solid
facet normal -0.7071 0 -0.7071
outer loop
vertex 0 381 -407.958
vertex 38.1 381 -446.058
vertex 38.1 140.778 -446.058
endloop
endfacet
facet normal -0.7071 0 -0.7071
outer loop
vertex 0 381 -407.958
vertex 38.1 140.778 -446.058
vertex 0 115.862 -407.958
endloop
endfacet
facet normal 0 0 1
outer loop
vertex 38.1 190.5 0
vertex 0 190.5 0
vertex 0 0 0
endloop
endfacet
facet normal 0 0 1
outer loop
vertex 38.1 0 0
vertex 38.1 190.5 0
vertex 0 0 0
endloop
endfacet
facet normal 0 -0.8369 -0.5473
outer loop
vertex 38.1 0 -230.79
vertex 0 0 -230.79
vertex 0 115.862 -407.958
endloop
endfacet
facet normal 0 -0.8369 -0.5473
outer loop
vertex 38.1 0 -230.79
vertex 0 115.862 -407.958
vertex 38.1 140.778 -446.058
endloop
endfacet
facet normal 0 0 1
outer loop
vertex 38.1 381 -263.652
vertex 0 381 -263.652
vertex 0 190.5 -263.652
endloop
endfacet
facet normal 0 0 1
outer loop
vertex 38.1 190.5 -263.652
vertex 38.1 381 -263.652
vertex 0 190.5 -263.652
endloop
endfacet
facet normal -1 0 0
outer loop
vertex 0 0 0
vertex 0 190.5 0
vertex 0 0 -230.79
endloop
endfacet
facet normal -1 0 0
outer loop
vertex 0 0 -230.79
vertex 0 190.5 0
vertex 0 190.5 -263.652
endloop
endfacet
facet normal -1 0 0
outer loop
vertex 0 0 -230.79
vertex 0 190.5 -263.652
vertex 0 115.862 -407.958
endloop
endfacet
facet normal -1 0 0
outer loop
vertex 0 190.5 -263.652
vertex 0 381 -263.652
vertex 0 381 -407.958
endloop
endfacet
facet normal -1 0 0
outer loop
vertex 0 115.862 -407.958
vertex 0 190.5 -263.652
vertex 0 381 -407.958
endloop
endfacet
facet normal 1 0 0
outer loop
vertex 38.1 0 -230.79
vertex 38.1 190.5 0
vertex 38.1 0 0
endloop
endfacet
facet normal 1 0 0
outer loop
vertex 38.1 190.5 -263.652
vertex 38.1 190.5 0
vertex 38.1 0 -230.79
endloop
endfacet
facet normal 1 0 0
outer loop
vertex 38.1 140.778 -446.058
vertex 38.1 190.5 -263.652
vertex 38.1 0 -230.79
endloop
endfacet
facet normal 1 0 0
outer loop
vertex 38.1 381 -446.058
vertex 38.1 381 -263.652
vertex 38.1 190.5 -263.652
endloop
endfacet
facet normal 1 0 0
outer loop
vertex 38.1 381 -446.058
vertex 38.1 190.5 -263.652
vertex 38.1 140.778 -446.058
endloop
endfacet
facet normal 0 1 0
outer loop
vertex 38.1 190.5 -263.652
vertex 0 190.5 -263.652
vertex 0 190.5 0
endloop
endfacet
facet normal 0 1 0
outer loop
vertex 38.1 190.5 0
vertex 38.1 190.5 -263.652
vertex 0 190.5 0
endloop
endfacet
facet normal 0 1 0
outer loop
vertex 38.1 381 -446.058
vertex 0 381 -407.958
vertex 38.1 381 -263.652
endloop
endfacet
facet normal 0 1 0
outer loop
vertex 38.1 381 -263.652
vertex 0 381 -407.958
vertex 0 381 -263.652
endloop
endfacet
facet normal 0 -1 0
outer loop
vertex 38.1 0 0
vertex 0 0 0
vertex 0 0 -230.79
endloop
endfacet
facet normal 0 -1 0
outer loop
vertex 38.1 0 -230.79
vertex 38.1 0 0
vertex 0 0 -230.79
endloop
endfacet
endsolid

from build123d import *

# Parameters (mm, degrees)
BOSS_EXTRUDE2_DEPTH = 38.1
CUT_EXTRUDE1_REACH  = 383


with BuildPart() as part:
    # Sketch1 → Boss-Extrude2 (new body)
    with BuildSketch(Plane(origin=(0, 0, 0), x_dir=(0, 0, -1), z_dir=(1, 0, 0))):
        Polygon((230.790126839, 0), (446.057536726, 140.777827649), (446.057536726, 381), (263.652, 381), (263.652, 190.5), (0, 190.5), (0, 0), align=None)
    extrude(amount=BOSS_EXTRUDE2_DEPTH)

    # Sketch2 → Cut-Extrude1 (cut, up to next)
    with BuildSketch(Plane(origin=(0, 381, 0), x_dir=(1, 0, 0), z_dir=(0, 1, 0)), mode=Mode.PRIVATE) as cut_extrude1_sk1:
        Polygon((38.1, 446.057536726), (0, 407.957536726), (0, 446.057536726), align=None)
    cut_extrude1_tool1 = extrude(cut_extrude1_sk1.sketch, amount=-CUT_EXTRUDE1_REACH, mode=Mode.PRIVATE) & part.part
    add(cut_extrude1_tool1.solids().sort_by_distance((12.7, 381, -433.357537))[0], mode=Mode.SUBTRACT)


solid = part.part
